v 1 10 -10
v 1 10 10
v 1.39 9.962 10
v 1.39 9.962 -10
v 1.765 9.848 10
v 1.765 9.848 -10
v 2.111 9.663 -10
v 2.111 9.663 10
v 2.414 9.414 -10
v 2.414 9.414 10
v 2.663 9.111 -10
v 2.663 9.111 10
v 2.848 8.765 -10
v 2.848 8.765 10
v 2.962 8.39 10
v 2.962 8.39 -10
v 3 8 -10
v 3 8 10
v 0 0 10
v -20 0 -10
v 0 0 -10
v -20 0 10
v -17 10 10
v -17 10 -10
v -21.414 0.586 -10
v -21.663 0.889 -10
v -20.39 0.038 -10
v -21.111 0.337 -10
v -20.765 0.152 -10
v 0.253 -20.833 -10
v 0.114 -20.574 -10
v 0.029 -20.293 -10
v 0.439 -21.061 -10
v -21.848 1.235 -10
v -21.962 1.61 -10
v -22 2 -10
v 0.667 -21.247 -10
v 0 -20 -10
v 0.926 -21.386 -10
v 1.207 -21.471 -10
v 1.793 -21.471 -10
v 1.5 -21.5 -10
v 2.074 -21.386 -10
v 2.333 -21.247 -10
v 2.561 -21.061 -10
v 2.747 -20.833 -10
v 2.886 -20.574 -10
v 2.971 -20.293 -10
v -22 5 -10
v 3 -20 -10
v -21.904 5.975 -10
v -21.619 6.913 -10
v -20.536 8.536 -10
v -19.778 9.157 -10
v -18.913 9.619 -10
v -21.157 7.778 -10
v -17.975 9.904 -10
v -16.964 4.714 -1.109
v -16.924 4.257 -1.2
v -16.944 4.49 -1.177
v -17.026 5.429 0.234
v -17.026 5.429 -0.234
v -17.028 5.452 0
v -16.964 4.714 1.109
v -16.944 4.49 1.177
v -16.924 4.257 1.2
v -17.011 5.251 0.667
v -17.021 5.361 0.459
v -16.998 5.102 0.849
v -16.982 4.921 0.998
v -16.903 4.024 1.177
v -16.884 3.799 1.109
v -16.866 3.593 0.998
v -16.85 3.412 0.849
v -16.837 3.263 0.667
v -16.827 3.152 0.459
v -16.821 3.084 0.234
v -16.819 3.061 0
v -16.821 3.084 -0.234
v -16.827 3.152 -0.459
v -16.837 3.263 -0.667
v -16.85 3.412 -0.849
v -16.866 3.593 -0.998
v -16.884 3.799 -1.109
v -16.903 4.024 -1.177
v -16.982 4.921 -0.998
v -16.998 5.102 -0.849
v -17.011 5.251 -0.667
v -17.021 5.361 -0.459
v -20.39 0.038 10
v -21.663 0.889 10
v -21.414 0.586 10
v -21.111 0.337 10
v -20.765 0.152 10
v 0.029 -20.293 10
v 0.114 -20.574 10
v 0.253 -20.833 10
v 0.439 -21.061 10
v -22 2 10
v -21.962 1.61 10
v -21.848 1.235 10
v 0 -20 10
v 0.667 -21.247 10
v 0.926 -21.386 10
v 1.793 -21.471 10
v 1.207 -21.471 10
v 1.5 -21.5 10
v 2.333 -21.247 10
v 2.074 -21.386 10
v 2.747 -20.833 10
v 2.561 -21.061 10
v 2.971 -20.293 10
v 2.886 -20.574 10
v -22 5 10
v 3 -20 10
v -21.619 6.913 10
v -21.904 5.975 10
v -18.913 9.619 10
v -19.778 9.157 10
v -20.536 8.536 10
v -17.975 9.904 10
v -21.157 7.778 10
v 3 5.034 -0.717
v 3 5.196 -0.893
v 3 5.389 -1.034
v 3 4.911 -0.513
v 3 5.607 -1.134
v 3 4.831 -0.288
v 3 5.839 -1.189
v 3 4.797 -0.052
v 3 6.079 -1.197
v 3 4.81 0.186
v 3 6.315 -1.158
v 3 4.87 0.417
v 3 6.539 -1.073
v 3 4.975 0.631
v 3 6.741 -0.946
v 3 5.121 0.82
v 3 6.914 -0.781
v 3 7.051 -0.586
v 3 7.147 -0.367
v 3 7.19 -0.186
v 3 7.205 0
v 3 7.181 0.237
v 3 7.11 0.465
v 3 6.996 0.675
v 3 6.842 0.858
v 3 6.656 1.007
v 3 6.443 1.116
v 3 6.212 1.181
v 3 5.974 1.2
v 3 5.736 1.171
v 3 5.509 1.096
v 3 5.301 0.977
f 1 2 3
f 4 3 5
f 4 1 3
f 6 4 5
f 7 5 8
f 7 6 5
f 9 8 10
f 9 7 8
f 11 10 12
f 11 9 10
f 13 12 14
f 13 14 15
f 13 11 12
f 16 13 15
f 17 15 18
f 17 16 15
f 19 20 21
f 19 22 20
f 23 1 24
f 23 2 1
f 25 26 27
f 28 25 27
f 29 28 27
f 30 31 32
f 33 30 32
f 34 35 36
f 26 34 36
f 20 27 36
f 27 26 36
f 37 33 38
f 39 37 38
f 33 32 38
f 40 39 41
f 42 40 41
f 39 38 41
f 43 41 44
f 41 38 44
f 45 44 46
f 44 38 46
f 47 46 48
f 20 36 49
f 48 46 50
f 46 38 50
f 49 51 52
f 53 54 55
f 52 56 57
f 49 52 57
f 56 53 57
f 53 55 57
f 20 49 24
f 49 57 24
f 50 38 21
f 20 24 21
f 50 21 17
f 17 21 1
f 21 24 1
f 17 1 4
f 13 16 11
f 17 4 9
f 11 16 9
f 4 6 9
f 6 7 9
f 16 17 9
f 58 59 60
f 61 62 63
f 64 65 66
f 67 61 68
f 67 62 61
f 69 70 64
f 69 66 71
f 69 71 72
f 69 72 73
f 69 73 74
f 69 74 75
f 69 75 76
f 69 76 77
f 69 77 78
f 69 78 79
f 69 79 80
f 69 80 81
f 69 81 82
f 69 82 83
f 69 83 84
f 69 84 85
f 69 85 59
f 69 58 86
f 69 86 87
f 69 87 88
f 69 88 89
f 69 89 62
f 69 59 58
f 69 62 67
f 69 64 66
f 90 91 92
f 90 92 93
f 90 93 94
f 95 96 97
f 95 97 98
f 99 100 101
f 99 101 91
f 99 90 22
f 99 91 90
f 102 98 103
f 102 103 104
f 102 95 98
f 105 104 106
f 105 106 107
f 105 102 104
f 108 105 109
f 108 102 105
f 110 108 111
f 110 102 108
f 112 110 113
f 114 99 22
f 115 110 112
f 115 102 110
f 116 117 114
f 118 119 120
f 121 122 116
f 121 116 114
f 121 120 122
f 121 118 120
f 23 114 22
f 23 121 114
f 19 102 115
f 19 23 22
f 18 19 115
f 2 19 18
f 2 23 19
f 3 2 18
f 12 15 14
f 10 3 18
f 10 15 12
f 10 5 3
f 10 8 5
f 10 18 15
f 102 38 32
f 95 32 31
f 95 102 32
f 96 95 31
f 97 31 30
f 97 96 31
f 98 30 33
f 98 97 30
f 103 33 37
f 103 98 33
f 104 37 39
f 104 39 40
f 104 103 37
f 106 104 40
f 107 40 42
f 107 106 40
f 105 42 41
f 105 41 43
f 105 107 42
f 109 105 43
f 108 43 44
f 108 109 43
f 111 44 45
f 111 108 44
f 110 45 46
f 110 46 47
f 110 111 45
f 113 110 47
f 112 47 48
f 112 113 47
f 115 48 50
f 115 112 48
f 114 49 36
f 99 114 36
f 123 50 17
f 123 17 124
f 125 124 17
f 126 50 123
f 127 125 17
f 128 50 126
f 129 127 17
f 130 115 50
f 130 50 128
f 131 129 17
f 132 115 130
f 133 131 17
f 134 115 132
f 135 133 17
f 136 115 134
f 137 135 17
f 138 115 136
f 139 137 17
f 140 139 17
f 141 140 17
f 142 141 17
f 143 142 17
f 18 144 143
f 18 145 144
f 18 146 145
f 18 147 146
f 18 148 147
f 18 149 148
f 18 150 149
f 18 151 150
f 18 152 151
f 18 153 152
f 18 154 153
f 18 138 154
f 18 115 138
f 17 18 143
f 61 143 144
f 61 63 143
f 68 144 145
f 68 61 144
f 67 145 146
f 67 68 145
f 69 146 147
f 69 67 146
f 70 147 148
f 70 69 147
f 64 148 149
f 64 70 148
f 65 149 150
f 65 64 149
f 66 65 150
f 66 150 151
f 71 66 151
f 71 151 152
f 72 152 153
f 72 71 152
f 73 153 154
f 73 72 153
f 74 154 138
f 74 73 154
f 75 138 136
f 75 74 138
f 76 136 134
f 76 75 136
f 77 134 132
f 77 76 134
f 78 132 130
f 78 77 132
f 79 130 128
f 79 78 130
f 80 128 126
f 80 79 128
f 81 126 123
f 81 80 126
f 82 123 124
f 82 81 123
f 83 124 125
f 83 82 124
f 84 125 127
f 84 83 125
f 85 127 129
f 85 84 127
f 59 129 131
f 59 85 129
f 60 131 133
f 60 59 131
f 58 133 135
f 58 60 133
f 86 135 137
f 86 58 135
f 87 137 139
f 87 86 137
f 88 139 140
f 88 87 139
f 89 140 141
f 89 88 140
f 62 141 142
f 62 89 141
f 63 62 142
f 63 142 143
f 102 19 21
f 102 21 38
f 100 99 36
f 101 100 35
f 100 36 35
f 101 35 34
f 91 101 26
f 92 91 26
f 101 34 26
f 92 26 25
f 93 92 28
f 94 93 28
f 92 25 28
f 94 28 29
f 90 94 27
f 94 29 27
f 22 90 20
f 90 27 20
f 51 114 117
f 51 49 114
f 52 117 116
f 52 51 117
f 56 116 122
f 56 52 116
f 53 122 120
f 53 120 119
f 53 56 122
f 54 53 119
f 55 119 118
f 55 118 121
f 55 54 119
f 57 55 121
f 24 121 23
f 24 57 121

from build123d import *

# Parameters (mm, degrees)
F1_DEPTH = 10
F4_R     = 5
F5_R     = 2


with BuildPart() as f1:
    # F0 (on Top) → F1 (new body, symmetric)
    with BuildSketch(Plane.XY):
        Polygon((-22, 0), (0, 0), (0, -20), (3, -20), (3, 10), (-22, 10), align=None)
        with BuildLine():
            Line((3, -20), (0, -20))
            ThreePointArc((0, -20), (1.5, -21.5), (3, -20))
        make_face()
    extrude(amount=F1_DEPTH, both=True)

    # F2 (on Top) → F3 (revolve, cut)
    with BuildSketch(Plane.XY):
        Polygon((-17.0284808531, 5.4523187828), (-16.9238939618, 4.256885145), (3, 6), (7.9809734905, 6.4357787137), (7.8763865992, 7.6312123514), align=None)
    revolve(axis=Axis((-4.4714602357, 5.3463319294, 0), (0.9961946981, 0.0871557427, 0)), mode=Mode.SUBTRACT)

    # F4
    f4_edges = [f1.edges().sort_by_distance(p)[0] for p in [
        (-22, 10, 0),
    ]]
    fillet(f4_edges, radius=F4_R)

    # F5
    f5_edges = [f1.edges().sort_by_distance(p)[0] for p in [
        (3, 10, 0),
        (-22, 0, 0),
    ]]
    fillet(f5_edges, radius=F5_R)


solid = f1.part
